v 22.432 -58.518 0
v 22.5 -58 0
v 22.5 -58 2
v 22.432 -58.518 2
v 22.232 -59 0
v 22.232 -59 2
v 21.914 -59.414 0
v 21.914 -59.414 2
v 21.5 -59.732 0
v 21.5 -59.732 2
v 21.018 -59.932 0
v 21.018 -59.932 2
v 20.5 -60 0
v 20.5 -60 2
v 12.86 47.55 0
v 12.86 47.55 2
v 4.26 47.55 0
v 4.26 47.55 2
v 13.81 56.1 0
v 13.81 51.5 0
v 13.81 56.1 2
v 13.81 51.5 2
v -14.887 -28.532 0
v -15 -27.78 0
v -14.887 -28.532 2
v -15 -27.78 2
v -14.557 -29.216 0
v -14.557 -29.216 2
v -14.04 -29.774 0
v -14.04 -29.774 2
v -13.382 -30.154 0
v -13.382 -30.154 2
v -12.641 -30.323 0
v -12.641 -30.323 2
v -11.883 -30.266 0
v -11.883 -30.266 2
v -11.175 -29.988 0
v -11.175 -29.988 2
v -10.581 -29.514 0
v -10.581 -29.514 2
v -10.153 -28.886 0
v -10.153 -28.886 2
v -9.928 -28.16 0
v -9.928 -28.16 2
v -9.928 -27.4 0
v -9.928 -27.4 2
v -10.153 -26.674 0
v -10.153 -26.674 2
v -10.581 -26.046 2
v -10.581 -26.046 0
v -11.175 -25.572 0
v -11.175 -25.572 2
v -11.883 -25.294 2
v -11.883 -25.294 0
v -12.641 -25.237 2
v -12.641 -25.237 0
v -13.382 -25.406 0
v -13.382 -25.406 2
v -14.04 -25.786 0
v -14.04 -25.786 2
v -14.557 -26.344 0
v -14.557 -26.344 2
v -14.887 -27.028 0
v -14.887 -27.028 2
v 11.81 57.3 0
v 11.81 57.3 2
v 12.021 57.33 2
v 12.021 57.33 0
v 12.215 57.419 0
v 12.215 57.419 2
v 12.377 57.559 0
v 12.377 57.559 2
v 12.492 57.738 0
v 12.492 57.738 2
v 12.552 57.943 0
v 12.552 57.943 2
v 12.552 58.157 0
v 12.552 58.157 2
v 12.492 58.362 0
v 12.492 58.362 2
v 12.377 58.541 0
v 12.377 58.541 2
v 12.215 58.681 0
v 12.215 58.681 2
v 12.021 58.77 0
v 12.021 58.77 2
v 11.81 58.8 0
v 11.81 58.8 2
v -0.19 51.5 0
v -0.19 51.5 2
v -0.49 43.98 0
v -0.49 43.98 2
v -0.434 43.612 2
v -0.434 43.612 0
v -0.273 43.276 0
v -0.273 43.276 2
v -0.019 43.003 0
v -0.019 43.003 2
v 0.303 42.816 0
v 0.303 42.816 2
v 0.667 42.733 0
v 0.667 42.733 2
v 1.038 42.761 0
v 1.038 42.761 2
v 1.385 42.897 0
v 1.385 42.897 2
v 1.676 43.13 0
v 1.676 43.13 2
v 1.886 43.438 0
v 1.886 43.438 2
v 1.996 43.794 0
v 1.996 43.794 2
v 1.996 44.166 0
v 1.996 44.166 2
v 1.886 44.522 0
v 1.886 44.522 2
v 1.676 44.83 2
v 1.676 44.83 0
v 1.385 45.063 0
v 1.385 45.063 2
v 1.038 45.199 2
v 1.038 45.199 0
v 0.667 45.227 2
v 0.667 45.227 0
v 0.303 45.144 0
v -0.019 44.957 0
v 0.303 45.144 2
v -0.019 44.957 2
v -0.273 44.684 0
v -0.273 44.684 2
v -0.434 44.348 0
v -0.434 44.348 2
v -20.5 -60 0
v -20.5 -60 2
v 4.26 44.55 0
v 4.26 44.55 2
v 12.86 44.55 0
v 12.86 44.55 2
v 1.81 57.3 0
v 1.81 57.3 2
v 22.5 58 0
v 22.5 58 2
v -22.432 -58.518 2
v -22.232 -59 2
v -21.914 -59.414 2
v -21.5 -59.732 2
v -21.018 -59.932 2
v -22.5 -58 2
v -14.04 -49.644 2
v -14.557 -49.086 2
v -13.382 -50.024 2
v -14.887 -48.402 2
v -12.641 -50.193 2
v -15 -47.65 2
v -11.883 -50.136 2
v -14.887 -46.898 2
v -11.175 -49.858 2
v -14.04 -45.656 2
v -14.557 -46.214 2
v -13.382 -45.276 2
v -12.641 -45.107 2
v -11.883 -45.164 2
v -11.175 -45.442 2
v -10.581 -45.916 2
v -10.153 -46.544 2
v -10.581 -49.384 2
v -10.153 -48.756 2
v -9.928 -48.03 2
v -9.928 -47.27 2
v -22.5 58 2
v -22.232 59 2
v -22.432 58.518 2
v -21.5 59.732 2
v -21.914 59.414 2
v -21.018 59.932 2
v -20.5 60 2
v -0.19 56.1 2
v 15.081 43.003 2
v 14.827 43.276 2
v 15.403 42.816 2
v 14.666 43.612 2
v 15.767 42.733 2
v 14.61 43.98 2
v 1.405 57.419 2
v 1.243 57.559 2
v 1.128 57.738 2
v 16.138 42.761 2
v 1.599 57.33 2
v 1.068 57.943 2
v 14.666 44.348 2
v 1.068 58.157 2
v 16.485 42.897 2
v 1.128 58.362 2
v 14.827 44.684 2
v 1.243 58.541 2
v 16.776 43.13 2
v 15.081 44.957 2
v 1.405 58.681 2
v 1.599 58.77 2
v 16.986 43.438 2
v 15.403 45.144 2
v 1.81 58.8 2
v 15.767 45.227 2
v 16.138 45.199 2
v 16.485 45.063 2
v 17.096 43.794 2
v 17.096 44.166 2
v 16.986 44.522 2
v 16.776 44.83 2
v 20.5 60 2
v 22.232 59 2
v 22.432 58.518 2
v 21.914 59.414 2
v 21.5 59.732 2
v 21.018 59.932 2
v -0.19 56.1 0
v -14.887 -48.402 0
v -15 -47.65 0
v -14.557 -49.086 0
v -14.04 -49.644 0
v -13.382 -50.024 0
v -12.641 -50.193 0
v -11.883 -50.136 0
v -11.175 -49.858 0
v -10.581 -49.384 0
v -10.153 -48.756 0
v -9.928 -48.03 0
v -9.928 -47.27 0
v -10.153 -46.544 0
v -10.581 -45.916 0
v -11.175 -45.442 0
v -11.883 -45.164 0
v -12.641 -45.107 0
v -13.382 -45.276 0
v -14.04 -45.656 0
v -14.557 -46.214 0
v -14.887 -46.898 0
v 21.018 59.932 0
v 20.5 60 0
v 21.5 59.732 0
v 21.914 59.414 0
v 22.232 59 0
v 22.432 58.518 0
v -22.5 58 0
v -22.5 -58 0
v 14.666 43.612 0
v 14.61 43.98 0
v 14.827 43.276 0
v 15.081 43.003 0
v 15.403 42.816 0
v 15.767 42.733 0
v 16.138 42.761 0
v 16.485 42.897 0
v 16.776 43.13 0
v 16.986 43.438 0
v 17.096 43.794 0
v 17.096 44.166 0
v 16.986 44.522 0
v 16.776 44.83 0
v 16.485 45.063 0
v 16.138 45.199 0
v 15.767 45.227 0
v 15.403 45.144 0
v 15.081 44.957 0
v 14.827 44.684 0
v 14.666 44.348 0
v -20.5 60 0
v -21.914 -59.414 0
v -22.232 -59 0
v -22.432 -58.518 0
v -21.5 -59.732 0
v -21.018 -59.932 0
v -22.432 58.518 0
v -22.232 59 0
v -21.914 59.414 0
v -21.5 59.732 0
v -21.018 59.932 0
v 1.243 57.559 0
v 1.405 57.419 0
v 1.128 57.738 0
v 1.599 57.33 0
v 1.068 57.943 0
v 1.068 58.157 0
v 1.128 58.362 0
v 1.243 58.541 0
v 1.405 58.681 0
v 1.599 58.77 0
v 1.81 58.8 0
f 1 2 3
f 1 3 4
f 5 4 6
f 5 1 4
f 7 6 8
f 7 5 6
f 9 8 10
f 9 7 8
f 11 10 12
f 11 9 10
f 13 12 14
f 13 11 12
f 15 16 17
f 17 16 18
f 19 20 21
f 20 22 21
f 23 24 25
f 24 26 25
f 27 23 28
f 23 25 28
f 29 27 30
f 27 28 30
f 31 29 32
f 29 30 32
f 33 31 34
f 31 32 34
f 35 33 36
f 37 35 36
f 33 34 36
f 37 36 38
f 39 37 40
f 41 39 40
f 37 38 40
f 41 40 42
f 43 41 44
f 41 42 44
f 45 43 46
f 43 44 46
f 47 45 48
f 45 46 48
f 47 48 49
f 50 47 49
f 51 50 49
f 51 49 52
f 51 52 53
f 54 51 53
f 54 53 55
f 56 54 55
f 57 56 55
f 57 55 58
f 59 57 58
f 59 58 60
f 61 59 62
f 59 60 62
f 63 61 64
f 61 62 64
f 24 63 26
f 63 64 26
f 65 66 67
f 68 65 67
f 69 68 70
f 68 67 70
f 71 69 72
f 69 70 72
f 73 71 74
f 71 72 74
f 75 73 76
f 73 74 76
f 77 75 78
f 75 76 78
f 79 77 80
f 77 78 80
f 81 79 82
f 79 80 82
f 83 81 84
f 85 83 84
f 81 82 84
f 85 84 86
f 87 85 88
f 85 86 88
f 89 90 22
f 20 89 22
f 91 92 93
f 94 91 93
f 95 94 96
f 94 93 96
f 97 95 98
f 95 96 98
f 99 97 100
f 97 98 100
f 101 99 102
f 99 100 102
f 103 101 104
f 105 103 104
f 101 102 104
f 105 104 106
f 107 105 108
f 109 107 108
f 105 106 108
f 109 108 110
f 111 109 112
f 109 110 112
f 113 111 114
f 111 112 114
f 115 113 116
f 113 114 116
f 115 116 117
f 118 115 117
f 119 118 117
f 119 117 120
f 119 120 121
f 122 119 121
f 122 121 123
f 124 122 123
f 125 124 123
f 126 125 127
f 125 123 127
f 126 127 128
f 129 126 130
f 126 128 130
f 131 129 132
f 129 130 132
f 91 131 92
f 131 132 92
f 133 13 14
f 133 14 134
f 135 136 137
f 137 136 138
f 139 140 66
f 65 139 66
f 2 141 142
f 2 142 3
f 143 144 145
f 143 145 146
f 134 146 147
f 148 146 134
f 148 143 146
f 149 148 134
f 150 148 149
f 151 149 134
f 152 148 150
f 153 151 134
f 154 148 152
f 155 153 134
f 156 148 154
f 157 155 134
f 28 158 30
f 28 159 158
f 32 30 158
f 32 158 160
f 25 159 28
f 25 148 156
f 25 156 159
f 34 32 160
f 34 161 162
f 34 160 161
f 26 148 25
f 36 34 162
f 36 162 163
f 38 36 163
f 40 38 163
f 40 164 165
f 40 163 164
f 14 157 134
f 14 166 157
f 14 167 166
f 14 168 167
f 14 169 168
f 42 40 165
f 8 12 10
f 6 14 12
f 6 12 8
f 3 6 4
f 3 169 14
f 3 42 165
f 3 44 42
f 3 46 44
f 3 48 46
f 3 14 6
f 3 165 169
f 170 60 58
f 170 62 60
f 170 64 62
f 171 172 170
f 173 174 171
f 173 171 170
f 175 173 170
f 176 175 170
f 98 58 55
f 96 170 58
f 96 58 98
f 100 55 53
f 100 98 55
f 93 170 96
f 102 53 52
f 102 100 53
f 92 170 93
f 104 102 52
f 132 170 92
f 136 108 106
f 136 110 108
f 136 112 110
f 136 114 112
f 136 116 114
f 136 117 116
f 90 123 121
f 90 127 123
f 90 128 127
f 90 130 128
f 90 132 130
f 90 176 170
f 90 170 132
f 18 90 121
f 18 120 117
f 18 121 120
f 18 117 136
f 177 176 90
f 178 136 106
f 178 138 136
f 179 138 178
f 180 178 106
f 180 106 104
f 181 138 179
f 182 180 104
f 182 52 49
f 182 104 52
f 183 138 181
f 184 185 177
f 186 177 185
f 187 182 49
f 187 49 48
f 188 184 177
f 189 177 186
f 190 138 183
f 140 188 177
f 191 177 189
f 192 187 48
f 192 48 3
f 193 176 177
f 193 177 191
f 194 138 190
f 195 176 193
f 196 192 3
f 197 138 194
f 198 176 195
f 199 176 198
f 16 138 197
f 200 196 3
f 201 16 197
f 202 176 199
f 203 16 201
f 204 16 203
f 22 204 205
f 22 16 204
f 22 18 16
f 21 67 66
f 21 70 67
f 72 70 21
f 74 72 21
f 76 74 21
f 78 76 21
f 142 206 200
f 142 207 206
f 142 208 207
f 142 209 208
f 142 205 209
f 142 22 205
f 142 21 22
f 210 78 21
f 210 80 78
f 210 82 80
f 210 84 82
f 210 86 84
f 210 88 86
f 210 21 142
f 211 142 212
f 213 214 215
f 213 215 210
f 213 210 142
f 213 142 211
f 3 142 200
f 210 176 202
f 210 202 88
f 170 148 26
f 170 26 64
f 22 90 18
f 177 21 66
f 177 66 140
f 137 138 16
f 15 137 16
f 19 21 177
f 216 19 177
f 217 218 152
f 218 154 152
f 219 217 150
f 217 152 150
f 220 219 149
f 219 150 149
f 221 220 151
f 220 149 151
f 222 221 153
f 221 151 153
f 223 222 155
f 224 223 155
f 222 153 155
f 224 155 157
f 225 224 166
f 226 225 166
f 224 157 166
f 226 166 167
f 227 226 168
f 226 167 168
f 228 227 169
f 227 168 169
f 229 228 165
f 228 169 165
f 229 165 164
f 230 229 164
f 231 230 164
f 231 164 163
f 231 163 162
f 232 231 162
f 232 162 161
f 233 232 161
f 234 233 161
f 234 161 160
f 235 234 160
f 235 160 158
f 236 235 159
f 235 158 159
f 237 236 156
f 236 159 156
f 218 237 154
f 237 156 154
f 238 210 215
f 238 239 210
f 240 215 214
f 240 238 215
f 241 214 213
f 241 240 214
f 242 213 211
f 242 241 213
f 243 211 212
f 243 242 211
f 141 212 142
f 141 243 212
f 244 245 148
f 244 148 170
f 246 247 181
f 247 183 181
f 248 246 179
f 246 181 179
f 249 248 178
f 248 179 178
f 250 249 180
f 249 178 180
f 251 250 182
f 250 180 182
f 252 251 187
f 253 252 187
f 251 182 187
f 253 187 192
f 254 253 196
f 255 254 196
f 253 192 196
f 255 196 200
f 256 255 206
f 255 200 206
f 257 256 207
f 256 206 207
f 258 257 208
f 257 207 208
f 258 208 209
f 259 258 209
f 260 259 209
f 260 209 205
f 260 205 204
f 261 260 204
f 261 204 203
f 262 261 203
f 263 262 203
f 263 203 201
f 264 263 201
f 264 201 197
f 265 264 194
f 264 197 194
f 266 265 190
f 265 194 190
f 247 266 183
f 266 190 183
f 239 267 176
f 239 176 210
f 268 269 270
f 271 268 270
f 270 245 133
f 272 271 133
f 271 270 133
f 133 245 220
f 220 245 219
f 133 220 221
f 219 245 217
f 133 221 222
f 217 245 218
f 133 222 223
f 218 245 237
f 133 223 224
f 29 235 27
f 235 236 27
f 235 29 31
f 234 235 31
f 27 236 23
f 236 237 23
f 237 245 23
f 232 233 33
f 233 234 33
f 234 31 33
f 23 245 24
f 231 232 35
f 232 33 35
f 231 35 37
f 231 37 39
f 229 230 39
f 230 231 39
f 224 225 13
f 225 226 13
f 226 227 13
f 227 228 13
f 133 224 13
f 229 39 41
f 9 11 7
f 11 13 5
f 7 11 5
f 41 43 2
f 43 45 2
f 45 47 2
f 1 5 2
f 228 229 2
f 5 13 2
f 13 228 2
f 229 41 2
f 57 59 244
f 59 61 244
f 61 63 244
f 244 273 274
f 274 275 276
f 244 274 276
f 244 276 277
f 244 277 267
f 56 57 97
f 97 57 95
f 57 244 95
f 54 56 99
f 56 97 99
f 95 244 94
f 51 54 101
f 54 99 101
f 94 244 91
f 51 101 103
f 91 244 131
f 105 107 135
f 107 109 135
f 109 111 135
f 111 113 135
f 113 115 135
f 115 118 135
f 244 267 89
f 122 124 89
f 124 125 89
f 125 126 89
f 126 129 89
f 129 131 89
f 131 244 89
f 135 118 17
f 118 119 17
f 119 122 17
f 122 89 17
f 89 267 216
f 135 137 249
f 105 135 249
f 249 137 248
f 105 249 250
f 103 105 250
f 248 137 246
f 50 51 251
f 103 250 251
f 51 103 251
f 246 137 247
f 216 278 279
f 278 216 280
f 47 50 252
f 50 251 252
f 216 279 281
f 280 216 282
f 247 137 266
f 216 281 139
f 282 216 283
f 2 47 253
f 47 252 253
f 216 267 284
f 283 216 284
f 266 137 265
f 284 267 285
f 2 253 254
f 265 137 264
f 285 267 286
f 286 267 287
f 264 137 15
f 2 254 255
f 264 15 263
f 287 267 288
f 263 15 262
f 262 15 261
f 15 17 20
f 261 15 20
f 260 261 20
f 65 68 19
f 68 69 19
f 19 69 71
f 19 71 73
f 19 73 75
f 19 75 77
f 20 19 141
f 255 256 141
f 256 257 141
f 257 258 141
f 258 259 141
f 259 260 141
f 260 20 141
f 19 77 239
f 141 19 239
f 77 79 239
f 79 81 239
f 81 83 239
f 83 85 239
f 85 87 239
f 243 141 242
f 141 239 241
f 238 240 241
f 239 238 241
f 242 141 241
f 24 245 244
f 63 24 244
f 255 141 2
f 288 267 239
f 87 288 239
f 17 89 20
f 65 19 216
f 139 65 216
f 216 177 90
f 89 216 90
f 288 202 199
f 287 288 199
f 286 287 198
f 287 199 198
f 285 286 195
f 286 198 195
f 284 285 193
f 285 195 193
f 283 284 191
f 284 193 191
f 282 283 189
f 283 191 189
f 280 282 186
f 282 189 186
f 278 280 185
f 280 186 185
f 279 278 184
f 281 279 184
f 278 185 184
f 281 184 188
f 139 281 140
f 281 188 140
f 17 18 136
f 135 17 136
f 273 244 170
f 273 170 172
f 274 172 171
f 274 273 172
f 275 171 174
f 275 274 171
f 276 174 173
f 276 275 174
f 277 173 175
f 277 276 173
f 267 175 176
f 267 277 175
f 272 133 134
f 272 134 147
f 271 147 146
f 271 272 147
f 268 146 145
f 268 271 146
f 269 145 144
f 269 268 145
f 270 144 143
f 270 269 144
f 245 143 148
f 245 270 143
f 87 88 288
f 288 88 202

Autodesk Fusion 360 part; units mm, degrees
sketch "Esboço1" plane through (0, 0, 0) normal (0, 0, 1) x (1, 0, 0)
  line L0 (-20.5, 60) -> (20.5, 60)
  line L1 (22.5, 58) -> (22.5, -58)
  line L2 (20.5, -60) -> (-20.5, -60)
  line L3 (-22.5, -58) -> (-22.5, 58)
  line L4 (-22.5, 60) -> (22.5, -60) construction
  line L5 (22.5, 60) -> (-22.5, -60) construction
  arc A0 (20.5, -60) -> (22.5, -58) centre (20.5, -58) ccw
  arc A1 (22.5, 58) -> (20.5, 60) centre (20.5, 58) ccw
  arc A2 (-20.5, 60) -> (-22.5, 58) centre (-20.5, 58) ccw
  arc A3 (-22.5, -58) -> (-20.5, -60) centre (-20.5, -58) ccw
  dimension "d1" = 45
  dimension "d2" = 120
  dimension "d27" = 2
extrude "Extrusão1" add sketch "Esboço1" along normal blind 2
sketch "Esboço2" plane through (0, 0, 2) normal (0, 0, 1) x (-1, 0, 0)
  line L0 (20.5, 60) -> (-20.5, 60)
  line L1 (-22.5, 58) -> (-22.5, -58)
  line L2 (-20.5, -60) -> (20.5, -60)
  line L3 (22.5, -58) -> (22.5, 58)
  circle A0 centre (12.45, 27.78) radius 2.55
  circle A1 centre (12.45, 47.65) radius 2.55
  line L4 (0.19, -51.5) -> (-13.81, -51.5)
  line L5 (-13.81, -51.5) -> (-13.81, -56.1)
  line L6 (-13.81, -56.1) -> (0.19, -56.1)
  line L7 (0.19, -56.1) -> (0.19, -51.5)
  line L8 (0.19, -51.5) -> (-13.81, -56.1) construction
  line L9 (-13.81, -51.5) -> (0.19, -56.1) construction
  line L10 (-4.26, -44.55) -> (-12.86, -44.55)
  line L11 (-12.86, -44.55) -> (-12.86, -47.55)
  line L12 (-12.86, -47.55) -> (-4.26, -47.55)
  line L13 (-4.26, -47.55) -> (-4.26, -44.55)
  line L14 (-4.26, -44.55) -> (-12.86, -47.55) construction
  line L15 (-12.86, -44.55) -> (-4.26, -47.55) construction
  circle A2 centre (-0.76, -43.98) radius 1.25
  circle A3 centre (-15.86, -43.98) radius 1.25
  arc A4 (20.5, -60) -> (22.5, -58) centre (20.5, -58) ccw
  arc A5 (22.5, 58) -> (20.5, 60) centre (20.5, 58) ccw
  arc A6 (-20.5, 60) -> (-22.5, 58) centre (-20.5, 58) ccw
  arc A7 (-22.5, -58) -> (-20.5, -60) centre (-20.5, -58) ccw
  line L16 (-1.81, -57.3) -> (-11.81, -57.3)
  arc A8 (-11.81, -57.3) -> (-11.81, -58.8) centre (-11.81, -58.05) ccw
  line L17 (-11.81, -58.8) -> (-1.81, -58.8)
  arc A9 (-1.81, -58.8) -> (-1.81, -57.3) centre (-1.81, -58.05) ccw
  line L18 (-1.81, -58.05) -> (-11.81, -58.05) construction
  point P0 (-6.81, -53.8)
  point P1 (-8.56, -46.05)
  dimension "d5" = 5.1
  dimension "d6" = 5.1
  dimension "d7" = 19.87
  dimension "d8" = 10.05
  dimension "d9" = 10.05
  dimension "d11" = 14
  dimension "d12" = 4.6
  dimension "d13" = 8.6
  dimension "d14" = 3
  dimension "d15" = 9.64
  dimension "d16" = 8.69
  dimension "d17" = 3.95
  dimension "d18" = 3.9
  dimension "d19" = 2.5
  dimension "d20" = 2.5
  dimension "d21" = 15.1
  dimension "d22" = 6.64
  dimension "d23" = 16.02
  dimension "d24" = 16.02
  dimension "d29" = 12.35
  dimension "d30" = 1.5
  dimension "d31" = 10
extrude "Extrusão2" cut sketch "Esboço2" against normal blind 15 contours A0 | A1 | L4 L5 L6 L7 | L10 L11 L12 L13 | A2 | A3 | L16 A8 L17 A9
sketch "Esboço4" plane through (0, 0, 2) normal (0, 0, 1) x (-1, 0, 0)
  circle A0 centre (12.45, 27.78) radius 2.55
  circle A1 centre (-15.86, -43.98) radius 1.25
  circle A2 centre (-0.76, -43.98) radius 1.25
  circle A3 centre (12.45, 47.65) radius 2.55
  line L0 (-12.86, -44.55) -> (-4.26, -44.55)
  line L1 (-4.26, -44.55) -> (-4.26, -47.55)
  line L2 (-4.26, -47.55) -> (-12.86, -47.55)
  line L3 (-12.86, -47.55) -> (-12.86, -44.55)
  line L4 (-13.81, -51.5) -> (0.19, -51.5)
  line L5 (0.19, -51.5) -> (0.19, -56.1)
  line L6 (0.19, -56.1) -> (-13.81, -56.1)
  line L7 (-13.81, -56.1) -> (-13.81, -51.5)
  line L8 (-11.81, -57.3) -> (-1.81, -57.3)
  arc A4 (-1.81, -58.8) -> (-1.81, -57.3) centre (-1.81, -58.05) ccw
  line L9 (-1.81, -58.8) -> (-11.81, -58.8)
  arc A5 (-11.81, -57.3) -> (-11.81, -58.8) centre (-11.81, -58.05) ccw
  arc A6 (20.5, -60) -> (22.5, -58) centre (20.5, -58) ccw
  line L10 (22.5, -58) -> (22.5, 58)
  arc A7 (22.5, 58) -> (20.5, 60) centre (20.5, 58) ccw
  line L11 (20.5, 60) -> (-20.5, 60)
  arc A8 (-20.5, 60) -> (-22.5, 58) centre (-20.5, 58) ccw
  line L12 (-22.5, 58) -> (-22.5, -58)
  arc A9 (-22.5, -58) -> (-20.5, -60) centre (-20.5, -58) ccw
  line L13 (-20.5, -60) -> (20.5, -60)
equation "d15 = 5.25 mm + 4.39 mm"
equation "d16 = 4.3 mm + 4.39 mm"
equation "d22 = 2.25 mm + 4.39 mm"
